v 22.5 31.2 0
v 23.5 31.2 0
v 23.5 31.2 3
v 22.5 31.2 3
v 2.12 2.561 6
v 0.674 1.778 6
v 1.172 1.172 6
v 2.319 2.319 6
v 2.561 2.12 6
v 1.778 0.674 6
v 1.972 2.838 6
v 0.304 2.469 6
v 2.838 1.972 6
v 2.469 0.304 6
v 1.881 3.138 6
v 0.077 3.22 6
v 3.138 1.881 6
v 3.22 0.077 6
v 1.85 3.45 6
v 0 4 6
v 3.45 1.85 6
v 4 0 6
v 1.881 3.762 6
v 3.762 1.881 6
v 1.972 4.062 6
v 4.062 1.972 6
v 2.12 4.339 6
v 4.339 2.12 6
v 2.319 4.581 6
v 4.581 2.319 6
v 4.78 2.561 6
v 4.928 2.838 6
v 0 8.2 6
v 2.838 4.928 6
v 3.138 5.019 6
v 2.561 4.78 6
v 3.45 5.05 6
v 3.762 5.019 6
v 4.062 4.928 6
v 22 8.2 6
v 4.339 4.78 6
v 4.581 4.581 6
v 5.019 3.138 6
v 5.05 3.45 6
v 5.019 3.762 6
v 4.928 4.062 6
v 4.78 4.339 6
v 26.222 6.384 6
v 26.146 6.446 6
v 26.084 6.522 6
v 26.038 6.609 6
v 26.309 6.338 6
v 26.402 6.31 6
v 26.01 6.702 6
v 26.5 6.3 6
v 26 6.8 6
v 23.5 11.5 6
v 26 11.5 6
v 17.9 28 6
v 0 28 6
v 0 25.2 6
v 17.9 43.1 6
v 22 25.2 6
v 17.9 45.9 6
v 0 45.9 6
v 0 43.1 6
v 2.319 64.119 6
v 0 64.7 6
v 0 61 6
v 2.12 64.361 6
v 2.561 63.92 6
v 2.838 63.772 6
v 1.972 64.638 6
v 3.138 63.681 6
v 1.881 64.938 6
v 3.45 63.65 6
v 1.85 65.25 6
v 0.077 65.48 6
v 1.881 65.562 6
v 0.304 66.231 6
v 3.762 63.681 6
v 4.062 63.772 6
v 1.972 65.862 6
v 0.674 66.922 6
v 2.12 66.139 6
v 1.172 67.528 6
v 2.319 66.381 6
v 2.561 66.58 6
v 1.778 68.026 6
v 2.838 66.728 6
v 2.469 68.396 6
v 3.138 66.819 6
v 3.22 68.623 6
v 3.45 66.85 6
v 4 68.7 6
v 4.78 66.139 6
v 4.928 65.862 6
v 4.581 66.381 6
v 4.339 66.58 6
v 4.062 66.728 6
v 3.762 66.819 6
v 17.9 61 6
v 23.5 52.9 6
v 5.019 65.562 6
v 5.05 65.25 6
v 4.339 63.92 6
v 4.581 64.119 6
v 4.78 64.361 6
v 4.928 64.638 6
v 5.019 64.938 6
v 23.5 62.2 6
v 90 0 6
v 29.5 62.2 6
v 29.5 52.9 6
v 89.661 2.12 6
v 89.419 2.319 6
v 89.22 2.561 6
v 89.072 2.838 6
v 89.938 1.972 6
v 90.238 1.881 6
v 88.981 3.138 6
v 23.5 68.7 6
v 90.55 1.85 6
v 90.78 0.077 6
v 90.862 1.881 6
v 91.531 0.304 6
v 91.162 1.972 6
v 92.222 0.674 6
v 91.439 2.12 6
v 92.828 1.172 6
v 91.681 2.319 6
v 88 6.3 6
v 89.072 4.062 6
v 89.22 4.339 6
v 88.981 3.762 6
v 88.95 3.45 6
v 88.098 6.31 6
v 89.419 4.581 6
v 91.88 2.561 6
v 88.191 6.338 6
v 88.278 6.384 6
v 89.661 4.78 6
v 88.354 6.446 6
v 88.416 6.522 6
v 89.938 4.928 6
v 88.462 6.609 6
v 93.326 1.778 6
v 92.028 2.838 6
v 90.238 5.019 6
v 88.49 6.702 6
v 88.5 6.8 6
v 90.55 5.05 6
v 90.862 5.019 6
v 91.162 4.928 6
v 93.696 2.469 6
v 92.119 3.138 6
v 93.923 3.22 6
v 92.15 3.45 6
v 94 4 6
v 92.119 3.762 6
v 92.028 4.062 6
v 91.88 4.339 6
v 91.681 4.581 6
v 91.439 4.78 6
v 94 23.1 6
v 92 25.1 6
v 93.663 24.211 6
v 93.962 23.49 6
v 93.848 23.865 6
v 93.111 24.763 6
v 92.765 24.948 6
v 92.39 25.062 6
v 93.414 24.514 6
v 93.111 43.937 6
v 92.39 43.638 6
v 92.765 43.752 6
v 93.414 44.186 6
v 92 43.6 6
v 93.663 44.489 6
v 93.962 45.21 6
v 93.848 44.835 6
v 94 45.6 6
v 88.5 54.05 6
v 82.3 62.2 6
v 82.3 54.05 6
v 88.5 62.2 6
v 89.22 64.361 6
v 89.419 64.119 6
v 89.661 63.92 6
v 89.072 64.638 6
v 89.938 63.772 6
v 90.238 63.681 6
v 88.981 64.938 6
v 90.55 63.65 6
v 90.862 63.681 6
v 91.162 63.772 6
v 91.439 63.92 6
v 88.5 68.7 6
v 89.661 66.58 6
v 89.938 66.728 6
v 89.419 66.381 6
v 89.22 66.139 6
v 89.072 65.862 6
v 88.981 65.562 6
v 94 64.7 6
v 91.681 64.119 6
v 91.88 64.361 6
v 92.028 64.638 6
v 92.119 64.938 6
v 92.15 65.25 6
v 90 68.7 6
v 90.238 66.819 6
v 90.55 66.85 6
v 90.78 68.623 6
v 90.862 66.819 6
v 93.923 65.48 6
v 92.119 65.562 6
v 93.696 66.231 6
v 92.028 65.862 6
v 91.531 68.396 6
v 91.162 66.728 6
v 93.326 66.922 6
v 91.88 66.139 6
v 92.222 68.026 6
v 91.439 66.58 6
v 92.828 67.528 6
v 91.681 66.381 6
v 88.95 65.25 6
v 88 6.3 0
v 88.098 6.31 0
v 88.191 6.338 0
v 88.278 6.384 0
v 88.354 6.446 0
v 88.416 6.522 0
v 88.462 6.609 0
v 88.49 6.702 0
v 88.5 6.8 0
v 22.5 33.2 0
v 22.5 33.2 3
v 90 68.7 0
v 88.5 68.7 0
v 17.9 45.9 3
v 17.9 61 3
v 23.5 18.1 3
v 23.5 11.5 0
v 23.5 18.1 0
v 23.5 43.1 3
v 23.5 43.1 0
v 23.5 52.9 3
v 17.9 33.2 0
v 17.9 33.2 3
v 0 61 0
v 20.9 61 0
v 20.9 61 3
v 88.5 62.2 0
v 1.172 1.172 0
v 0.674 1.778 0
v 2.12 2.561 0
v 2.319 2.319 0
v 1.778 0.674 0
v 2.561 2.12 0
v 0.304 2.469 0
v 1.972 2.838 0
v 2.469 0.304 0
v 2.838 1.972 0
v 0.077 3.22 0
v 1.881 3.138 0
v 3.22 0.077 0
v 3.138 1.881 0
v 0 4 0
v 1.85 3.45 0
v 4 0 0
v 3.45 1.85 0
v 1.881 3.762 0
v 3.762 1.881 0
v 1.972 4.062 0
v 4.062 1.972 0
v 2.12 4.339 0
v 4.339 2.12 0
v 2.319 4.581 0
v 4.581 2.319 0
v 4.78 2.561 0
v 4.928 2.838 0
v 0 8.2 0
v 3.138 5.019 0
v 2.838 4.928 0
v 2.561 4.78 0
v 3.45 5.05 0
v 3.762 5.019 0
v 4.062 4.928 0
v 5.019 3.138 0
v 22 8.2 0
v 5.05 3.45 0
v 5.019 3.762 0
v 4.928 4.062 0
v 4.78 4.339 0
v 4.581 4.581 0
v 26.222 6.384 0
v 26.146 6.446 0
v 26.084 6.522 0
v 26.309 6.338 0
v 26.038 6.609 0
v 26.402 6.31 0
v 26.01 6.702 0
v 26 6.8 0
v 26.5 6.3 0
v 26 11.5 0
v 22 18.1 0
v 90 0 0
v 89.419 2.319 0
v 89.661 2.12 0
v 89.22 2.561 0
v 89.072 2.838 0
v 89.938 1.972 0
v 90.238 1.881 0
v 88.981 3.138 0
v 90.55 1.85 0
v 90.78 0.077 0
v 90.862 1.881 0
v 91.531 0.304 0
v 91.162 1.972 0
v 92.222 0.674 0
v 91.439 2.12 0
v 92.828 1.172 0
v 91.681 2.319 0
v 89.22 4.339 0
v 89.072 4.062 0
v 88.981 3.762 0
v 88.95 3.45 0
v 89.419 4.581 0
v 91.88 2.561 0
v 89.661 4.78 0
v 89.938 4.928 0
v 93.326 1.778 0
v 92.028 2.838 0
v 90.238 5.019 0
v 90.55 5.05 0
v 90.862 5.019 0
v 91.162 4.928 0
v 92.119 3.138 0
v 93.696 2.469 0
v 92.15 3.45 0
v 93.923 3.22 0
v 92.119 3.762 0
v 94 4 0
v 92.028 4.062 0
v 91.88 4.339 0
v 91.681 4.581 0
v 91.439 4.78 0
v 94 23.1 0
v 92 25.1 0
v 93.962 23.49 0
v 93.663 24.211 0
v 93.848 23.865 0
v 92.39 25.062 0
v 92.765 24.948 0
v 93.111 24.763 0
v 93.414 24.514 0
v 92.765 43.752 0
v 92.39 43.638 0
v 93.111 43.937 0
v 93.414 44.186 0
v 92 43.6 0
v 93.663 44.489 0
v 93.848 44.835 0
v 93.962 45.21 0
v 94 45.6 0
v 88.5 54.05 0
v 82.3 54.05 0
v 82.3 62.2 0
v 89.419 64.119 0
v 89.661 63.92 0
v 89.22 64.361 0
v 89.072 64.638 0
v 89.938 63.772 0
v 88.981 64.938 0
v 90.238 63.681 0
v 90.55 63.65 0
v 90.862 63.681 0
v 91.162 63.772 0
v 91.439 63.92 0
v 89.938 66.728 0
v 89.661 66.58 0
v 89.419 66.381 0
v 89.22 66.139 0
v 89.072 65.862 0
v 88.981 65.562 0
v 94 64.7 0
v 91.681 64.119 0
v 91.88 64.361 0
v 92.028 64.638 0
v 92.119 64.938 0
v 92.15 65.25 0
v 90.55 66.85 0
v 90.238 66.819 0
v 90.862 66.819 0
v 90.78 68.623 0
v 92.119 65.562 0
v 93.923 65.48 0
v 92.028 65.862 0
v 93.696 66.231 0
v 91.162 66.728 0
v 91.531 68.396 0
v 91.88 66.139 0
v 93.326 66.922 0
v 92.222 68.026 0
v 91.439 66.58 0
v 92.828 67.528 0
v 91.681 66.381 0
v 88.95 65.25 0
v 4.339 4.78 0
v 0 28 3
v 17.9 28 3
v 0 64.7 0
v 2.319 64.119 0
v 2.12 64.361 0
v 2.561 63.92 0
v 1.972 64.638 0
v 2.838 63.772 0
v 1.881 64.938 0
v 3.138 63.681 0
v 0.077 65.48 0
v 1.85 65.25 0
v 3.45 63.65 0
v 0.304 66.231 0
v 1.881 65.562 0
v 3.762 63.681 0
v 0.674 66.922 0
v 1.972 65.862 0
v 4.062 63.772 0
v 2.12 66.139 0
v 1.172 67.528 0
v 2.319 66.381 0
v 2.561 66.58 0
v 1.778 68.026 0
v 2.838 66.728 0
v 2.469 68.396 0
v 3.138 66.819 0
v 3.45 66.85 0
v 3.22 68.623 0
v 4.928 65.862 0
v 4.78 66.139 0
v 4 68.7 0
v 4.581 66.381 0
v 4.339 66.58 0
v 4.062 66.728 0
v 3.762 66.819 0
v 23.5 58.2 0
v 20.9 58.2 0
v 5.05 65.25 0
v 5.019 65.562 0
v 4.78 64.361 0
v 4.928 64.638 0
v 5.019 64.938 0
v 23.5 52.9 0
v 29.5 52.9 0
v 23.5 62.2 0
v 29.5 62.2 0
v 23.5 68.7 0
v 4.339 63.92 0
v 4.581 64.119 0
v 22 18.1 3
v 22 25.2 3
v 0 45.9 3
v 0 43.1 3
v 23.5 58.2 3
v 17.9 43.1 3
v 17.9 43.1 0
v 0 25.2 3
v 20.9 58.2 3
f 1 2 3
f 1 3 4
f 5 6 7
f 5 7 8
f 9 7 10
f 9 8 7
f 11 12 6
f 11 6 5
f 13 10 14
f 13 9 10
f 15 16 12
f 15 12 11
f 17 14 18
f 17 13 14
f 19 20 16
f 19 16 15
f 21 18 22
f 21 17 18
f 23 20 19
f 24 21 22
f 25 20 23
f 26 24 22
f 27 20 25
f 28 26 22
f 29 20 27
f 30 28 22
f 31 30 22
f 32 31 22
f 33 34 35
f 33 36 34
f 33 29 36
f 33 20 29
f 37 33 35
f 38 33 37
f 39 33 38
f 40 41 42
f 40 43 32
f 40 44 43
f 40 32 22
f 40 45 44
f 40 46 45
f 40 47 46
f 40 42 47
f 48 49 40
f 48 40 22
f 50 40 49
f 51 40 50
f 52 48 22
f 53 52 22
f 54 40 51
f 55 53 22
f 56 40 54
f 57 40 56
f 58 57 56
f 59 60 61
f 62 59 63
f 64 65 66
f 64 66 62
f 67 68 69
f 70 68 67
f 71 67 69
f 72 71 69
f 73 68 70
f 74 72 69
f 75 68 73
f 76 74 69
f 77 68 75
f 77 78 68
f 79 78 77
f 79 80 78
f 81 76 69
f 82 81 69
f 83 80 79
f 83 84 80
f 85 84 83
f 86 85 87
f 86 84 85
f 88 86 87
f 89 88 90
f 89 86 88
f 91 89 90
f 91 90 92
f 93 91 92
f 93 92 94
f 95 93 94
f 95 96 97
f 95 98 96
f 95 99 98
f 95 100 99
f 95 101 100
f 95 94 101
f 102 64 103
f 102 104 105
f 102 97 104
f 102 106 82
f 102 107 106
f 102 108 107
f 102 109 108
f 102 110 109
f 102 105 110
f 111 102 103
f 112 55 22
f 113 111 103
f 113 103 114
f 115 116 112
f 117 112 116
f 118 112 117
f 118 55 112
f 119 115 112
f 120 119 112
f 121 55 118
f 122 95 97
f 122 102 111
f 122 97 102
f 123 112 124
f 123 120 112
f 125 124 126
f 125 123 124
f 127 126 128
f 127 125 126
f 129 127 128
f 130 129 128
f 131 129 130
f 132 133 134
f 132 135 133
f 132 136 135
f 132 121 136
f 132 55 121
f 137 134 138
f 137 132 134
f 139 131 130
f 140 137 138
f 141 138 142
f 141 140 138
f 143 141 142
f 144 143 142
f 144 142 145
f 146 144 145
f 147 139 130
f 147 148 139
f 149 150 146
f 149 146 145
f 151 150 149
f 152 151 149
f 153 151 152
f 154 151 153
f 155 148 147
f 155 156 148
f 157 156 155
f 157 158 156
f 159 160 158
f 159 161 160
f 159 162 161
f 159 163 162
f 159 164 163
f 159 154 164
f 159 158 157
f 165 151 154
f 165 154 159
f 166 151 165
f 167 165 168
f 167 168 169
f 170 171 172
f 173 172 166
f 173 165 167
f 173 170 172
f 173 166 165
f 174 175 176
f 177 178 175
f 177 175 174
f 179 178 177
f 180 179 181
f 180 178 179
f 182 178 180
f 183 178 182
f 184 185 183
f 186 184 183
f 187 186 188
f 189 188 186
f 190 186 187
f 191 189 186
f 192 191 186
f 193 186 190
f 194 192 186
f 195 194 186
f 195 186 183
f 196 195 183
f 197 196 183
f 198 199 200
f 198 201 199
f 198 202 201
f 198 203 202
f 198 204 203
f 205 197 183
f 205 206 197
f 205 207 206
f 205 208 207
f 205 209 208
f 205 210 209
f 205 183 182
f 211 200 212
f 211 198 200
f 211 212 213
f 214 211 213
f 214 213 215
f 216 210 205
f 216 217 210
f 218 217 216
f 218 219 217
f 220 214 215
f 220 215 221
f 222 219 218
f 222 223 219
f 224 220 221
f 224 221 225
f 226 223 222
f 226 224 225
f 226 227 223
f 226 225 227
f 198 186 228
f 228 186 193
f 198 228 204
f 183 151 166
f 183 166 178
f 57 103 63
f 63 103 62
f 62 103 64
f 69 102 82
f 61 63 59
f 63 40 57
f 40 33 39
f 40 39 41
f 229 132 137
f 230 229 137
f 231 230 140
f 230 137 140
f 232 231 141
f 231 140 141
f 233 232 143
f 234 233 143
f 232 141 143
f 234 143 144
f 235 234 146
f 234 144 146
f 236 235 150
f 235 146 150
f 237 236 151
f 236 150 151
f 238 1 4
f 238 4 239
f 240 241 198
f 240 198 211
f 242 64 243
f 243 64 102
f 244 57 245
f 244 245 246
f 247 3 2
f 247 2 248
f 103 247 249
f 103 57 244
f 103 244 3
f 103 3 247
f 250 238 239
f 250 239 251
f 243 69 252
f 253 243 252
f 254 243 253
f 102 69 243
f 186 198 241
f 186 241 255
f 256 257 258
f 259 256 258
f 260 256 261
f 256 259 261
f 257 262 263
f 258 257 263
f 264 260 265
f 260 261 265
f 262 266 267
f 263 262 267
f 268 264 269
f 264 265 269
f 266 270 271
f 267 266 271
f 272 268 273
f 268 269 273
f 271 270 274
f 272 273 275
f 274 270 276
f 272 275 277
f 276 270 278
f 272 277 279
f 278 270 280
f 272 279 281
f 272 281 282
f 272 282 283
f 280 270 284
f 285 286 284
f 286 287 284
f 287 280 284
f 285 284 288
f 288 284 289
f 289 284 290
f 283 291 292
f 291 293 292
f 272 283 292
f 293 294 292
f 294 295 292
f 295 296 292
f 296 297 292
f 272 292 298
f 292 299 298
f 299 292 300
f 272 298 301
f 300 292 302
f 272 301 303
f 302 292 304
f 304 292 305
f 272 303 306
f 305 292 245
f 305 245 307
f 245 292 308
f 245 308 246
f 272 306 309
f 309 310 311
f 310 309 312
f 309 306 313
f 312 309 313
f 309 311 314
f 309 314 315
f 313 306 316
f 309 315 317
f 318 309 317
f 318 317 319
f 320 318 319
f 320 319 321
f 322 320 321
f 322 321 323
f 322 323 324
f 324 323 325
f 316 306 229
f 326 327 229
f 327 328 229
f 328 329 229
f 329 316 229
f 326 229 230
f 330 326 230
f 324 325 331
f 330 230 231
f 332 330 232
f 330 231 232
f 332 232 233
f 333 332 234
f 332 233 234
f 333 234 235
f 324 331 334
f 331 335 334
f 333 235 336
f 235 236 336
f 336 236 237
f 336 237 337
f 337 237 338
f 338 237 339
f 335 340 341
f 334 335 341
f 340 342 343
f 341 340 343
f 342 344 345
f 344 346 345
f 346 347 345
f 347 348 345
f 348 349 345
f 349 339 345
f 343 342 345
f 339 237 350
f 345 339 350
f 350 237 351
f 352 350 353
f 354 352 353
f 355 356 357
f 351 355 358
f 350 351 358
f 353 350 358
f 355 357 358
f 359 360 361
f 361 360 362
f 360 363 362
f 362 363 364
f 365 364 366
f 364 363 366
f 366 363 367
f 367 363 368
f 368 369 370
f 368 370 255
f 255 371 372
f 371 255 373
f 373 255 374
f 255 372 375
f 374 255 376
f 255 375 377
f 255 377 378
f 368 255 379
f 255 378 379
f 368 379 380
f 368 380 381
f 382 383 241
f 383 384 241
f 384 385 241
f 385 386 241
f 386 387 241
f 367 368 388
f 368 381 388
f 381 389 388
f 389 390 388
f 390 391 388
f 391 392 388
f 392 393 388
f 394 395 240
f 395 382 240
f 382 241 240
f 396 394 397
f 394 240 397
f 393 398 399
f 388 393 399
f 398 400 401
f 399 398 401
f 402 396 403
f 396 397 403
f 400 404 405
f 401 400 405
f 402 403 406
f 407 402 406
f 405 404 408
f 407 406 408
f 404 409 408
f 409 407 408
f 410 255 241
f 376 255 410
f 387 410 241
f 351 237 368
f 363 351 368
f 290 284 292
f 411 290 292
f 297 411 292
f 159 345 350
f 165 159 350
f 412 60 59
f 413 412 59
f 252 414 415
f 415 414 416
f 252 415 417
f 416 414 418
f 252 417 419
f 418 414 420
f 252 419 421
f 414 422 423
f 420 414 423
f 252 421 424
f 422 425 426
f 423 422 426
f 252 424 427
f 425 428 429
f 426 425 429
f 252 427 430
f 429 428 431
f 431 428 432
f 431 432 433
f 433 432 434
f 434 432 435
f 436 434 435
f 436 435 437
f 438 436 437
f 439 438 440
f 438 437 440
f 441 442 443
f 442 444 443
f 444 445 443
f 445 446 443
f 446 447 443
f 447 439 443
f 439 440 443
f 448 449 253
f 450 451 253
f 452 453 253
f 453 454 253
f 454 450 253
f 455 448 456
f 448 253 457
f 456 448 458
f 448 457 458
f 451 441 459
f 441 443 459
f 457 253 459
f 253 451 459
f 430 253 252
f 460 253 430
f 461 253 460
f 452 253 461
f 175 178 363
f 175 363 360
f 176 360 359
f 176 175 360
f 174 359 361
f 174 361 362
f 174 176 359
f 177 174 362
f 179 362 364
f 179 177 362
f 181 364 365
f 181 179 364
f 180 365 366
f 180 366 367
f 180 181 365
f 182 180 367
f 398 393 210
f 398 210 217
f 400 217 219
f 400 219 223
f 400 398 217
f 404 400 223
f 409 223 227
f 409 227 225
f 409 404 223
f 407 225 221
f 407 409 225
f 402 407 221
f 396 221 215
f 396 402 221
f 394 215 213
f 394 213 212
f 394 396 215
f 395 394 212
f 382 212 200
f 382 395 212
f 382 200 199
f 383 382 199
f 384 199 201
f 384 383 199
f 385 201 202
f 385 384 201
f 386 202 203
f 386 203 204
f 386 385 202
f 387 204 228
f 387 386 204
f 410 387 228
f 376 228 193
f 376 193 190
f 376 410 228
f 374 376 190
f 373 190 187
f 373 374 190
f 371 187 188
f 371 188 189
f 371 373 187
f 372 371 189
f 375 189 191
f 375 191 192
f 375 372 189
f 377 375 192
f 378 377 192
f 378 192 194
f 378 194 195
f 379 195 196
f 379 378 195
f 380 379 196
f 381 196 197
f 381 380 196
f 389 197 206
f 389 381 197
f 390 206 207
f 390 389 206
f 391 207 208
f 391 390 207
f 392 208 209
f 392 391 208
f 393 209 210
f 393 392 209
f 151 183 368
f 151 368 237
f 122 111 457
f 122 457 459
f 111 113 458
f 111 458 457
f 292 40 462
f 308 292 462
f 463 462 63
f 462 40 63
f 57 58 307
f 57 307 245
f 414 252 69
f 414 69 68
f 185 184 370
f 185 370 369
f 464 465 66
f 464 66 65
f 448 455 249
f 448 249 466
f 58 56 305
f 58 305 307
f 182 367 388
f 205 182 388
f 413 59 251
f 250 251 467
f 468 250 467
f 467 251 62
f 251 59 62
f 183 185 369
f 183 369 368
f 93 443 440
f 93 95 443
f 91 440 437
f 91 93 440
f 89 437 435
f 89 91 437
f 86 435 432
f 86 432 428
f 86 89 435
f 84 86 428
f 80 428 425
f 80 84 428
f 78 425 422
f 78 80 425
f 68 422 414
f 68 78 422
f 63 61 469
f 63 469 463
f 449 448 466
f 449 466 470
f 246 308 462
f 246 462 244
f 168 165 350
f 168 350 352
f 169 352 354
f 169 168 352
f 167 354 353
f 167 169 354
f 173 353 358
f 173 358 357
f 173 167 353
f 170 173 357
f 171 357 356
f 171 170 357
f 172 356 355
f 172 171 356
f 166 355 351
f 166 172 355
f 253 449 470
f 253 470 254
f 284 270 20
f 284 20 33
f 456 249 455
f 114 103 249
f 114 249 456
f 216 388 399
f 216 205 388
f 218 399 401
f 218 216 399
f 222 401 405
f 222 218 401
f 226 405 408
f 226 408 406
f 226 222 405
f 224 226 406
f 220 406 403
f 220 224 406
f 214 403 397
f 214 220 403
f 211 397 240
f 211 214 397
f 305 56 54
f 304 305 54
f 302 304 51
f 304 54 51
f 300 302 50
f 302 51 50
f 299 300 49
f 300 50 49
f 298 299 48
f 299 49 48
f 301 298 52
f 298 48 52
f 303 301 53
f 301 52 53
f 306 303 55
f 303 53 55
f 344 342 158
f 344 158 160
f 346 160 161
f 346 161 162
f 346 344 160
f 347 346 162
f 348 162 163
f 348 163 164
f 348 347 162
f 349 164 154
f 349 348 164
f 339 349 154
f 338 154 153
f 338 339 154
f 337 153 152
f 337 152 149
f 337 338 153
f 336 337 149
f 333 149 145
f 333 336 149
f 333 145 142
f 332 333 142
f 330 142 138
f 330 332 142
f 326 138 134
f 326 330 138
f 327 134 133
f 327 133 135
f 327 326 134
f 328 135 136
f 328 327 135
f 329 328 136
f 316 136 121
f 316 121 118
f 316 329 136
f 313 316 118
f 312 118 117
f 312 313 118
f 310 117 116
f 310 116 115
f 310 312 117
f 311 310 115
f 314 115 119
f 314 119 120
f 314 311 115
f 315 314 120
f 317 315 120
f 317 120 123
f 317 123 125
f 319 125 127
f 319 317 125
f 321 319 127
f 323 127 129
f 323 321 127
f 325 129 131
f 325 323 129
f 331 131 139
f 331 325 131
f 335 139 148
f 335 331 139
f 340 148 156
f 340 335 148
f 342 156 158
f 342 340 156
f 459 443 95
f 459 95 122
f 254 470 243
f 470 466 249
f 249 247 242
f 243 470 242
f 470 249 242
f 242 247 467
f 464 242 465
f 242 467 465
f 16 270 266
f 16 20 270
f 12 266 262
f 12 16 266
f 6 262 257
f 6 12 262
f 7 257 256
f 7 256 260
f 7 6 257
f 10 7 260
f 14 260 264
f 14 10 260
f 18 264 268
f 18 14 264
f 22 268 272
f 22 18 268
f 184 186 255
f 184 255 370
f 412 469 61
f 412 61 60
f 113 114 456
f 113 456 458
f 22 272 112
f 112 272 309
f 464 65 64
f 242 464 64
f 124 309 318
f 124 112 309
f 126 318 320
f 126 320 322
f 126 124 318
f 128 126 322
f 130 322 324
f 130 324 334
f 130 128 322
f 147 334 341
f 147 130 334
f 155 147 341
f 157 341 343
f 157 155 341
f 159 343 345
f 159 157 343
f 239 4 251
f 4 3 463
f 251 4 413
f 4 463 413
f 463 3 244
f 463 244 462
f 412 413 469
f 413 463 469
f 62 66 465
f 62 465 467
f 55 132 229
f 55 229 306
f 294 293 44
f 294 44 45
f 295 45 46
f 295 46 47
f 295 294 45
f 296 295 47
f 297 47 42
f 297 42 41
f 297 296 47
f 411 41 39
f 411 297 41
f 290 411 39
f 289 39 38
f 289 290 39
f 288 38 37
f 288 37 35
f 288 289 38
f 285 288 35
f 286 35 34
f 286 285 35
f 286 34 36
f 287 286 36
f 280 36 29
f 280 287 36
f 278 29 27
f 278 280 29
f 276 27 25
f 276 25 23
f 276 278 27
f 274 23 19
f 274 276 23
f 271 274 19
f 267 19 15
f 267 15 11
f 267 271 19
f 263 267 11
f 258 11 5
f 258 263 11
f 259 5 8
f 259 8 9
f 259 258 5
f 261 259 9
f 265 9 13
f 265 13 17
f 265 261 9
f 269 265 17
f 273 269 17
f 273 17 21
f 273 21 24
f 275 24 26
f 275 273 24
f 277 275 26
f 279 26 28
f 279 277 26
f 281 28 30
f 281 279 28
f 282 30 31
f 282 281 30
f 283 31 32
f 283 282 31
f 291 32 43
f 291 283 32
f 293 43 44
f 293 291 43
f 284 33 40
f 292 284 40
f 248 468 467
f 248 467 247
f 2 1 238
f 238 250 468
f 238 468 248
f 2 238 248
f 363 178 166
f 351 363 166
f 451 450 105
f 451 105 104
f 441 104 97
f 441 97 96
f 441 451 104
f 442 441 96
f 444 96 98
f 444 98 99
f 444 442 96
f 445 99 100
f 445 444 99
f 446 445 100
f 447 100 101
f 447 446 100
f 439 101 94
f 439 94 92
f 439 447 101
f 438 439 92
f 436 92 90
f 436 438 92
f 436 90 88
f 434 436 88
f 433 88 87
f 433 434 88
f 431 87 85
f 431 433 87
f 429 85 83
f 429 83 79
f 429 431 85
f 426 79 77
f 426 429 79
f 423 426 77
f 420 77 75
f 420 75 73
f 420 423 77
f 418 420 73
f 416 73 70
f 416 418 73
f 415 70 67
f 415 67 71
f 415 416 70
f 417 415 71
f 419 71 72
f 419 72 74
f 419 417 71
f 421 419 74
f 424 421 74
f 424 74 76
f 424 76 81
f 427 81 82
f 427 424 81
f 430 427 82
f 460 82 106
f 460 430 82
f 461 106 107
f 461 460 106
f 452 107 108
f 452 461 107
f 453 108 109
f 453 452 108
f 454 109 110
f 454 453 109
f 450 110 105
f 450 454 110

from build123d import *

# Parameters (mm, degrees)
SKETCH_W        = 94
SKETCH_H        = 68.7
SKETCH_R        = 1.6
PAD_DEPTH       = 6
SKETCH001_W     = 22
SKETCH001_H     = 17
SKETCH001_W_2   = 17.9
SKETCH001_H_2   = 15.1
POCKET_DEPTH    = 6
POCKET001_DEPTH = 3
FILLET_R        = 4


with BuildPart() as part:
    # Sketch → Pad (new body)
    with BuildSketch(Plane.XY):
        with Locations((47, 34.35)):
            Rectangle(SKETCH_W, SKETCH_H)
        with Locations((3.45, 65.25)):
            Circle(SKETCH_R, mode=Mode.SUBTRACT)
        with Locations((90.55, 65.25)):
            Circle(SKETCH_R, mode=Mode.SUBTRACT)
        with Locations((90.55, 3.45)):
            Circle(SKETCH_R, mode=Mode.SUBTRACT)
        with Locations((3.45, 3.45)):
            Circle(SKETCH_R, mode=Mode.SUBTRACT)
    extrude(amount=PAD_DEPTH)

    # Sketch001 (on Face10 of Pad) → Pocket (cut)
    with BuildSketch(Plane.XY.offset(6)):
        with Locations((11, 16.7)):
            Rectangle(SKETCH001_W, SKETCH001_H)
        with Locations((8.95, 35.55)):
            Rectangle(SKETCH001_W_2, SKETCH001_H_2)
        with Locations((8.95, 53.45)):
            Rectangle(SKETCH001_W_2, SKETCH001_H_2)
        with BuildLine():
            Line((92, 43.6), (92, 25.1))
            ThreePointArc((94, 23.1), (93.414214, 24.514214), (92, 25.1))
            Line((94, 23.1), (94, 45.6))
            ThreePointArc((92, 43.6), (93.414214, 44.185786), (94, 45.6))
        make_face()
        with BuildLine():
            Line((88.5, 68.7), (88.5, 62.2))
            Line((88.5, 62.2), (82.3, 62.2))
            Line((82.3, 62.2), (82.3, 54.05))
            Line((82.3, 54.05), (88.5, 54.05))
            Line((88.5, 54.05), (88.5, 6.8))
            ThreePointArc((88, 6.3), (88.353553, 6.446447), (88.5, 6.8))
            Line((88, 6.3), (26.5, 6.3))
            ThreePointArc((26, 6.8), (26.146447, 6.446447), (26.5, 6.3))
            Line((26, 6.8), (26, 11.5))
            Line((26, 11.5), (23.5, 11.5))
            Line((23.5, 11.5), (23.5, 52.9))
            Line((23.5, 52.9), (29.5, 52.9))
            Line((29.5, 52.9), (29.5, 62.2))
            Line((29.5, 62.2), (23.5, 62.2))
            Line((23.5, 62.2), (23.5, 68.7))
            Line((23.5, 68.7), (88.5, 68.7))
        make_face()
    extrude(amount=-POCKET_DEPTH, mode=Mode.SUBTRACT)

    # Sketch002 (on Face4 of Pocket) → Pocket001 (cut)
    with BuildSketch(Plane(origin=(0, 0, 0), x_dir=(1, 0, 0), z_dir=(0, 0, -1))):
        Polygon((22, -18.1), (23.5, -18.1), (23.5, -31.2), (22.5, -31.2), (22.5, -33.2), (17.9, -33.2), (17.9, -28), (0, -28), (0, -25.2), (22, -25.2), align=None)
        Polygon((0, -43.1), (23.5, -43.1), (23.5, -58.2), (20.9, -58.2), (20.9, -61), (17.9, -61), (17.9, -45.9), (0, -45.9), align=None)
    extrude(amount=-POCKET001_DEPTH, mode=Mode.SUBTRACT)

    # Fillet
    fillet_edges = [part.edges().sort_by_distance(p)[0] for p in [
        (0, 68.7, 3),
        (0, 0, 3),
        (94, 0, 3),
        (94, 68.7, 3),
    ]]
    fillet(fillet_edges, radius=FILLET_R)


solid = part.part
